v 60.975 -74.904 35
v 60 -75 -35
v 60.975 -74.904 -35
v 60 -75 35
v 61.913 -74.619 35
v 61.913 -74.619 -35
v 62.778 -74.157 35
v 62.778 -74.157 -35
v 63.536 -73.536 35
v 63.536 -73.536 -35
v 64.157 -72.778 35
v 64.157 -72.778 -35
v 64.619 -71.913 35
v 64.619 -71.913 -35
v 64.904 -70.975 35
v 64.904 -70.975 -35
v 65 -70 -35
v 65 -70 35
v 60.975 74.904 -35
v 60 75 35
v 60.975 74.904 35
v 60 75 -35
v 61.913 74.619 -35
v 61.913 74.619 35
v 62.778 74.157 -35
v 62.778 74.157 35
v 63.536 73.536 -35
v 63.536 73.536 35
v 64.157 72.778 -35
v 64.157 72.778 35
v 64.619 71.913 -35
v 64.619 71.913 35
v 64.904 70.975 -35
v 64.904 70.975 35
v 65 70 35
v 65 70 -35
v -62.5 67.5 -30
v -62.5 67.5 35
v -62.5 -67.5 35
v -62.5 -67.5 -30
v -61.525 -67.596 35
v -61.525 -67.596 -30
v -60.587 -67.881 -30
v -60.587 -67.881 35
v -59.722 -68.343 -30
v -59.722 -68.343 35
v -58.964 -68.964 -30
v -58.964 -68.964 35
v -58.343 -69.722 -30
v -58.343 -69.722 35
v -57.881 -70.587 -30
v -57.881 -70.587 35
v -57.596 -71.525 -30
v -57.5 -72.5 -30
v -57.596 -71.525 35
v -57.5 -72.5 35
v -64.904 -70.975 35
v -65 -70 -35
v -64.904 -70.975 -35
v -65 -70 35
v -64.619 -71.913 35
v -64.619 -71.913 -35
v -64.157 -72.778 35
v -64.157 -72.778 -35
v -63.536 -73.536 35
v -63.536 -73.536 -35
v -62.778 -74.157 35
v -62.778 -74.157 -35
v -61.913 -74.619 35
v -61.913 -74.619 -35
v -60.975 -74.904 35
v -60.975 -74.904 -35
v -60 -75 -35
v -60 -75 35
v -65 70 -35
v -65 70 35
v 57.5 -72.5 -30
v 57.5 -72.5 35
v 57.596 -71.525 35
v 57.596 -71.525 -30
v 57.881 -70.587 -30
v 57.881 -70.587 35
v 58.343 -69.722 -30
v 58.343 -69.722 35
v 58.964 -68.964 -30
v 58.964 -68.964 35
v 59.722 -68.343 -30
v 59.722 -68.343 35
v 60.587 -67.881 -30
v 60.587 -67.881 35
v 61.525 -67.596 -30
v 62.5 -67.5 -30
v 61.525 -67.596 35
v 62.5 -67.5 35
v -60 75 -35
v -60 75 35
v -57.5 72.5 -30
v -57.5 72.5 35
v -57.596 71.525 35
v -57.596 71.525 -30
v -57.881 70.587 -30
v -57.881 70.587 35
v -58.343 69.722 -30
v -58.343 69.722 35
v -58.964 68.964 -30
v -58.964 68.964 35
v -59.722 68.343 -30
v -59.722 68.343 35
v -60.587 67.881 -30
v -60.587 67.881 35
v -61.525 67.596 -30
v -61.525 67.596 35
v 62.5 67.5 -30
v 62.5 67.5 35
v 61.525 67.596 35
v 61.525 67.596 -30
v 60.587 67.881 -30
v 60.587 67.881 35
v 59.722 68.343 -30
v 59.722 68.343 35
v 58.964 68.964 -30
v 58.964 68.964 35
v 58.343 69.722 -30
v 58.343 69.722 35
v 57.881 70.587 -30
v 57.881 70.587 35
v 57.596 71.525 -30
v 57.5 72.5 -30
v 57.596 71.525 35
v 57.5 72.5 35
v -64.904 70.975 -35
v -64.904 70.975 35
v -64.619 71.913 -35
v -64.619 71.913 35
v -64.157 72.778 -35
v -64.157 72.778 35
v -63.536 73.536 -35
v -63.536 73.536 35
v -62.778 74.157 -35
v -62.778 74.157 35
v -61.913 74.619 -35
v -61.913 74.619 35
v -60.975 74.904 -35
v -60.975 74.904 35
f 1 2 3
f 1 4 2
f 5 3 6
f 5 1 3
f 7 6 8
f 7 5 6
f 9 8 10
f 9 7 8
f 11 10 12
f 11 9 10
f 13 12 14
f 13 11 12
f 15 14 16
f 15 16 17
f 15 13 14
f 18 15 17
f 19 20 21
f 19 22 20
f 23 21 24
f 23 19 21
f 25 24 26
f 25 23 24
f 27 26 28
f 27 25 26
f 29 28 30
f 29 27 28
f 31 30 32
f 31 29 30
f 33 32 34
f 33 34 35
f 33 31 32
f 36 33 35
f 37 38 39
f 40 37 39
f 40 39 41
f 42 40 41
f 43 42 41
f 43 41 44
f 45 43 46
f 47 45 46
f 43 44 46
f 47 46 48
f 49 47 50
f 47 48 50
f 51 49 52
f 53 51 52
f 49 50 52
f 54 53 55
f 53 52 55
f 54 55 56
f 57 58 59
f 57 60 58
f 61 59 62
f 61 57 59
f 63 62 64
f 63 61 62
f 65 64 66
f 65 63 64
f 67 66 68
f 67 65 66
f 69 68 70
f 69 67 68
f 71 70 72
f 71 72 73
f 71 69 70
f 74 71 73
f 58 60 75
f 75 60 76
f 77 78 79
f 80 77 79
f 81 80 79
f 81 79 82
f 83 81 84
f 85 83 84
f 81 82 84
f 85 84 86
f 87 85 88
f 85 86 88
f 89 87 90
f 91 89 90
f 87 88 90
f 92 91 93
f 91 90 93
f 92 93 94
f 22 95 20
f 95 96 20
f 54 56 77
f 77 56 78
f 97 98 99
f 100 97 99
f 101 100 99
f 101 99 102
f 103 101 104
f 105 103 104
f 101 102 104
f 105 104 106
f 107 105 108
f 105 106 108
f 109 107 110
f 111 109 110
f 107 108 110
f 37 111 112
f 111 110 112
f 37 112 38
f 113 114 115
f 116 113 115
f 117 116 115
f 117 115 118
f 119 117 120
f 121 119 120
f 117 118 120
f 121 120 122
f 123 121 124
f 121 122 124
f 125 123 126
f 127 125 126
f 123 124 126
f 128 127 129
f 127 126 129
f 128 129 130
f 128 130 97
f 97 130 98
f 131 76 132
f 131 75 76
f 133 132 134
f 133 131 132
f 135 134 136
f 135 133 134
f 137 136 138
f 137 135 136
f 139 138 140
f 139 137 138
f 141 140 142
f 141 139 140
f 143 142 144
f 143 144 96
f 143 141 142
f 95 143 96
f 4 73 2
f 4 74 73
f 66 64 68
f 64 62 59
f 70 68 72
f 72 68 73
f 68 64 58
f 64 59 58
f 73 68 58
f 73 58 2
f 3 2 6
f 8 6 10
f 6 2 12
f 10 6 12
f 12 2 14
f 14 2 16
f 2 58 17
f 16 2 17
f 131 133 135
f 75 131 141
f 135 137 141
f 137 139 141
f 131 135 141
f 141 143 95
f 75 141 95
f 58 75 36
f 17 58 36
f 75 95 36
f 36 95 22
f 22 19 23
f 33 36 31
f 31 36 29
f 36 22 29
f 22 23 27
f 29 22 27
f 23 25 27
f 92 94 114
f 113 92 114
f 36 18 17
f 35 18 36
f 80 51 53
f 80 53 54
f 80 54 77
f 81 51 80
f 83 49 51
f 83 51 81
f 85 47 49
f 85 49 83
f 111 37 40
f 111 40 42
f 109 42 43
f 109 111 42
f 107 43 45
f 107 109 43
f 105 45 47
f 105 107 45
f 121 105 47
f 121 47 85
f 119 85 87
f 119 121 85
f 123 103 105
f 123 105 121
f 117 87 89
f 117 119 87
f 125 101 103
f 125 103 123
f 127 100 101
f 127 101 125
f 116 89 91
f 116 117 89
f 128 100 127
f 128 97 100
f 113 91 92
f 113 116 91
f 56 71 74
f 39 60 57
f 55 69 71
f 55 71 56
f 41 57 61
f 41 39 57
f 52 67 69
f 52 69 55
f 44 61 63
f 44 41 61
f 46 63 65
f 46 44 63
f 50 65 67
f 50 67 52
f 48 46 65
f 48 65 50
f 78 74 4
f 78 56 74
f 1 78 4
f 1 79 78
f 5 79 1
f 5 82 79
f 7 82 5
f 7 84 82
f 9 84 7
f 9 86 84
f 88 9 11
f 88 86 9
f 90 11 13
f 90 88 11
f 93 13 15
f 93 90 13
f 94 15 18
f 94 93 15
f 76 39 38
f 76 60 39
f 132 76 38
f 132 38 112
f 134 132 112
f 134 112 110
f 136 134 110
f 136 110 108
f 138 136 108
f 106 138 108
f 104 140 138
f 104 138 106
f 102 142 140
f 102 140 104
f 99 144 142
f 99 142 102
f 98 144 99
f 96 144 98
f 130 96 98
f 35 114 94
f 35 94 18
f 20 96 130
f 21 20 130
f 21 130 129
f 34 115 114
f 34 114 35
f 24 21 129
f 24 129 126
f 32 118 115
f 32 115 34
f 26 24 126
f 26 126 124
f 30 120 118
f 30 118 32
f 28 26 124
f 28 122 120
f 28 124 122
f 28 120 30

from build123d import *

# Parameters (mm, degrees)
SKETCH2_W           = 130
SKETCH2_H           = 150
BOSS_EXTRUDE2_DEPTH = 35
CUT_EXTRUDE2_DEPTH  = 65
FILLET1_R           = 5


with BuildPart() as part:
    # Sketch2 → Boss-Extrude2 (new body, symmetric)
    with BuildSketch(Plane.XY):
        Rectangle(SKETCH2_W, SKETCH2_H)
    extrude(amount=BOSS_EXTRUDE2_DEPTH, both=True)

    # Sketch3 → Cut-Extrude2 (cut)
    with BuildSketch(Plane.XY.offset(35)):
        with BuildLine():
            Line((57.5, 72.5), (-57.5, 72.5))
            ThreePointArc((-57.5, 72.5), (-58.964466094, 68.964466094), (-62.5, 67.5))
            Line((-62.5, 67.5), (-62.5, -67.5))
            ThreePointArc((-62.5, -67.5), (-58.964466094, -68.964466094), (-57.5, -72.5))
            Line((-57.5, -72.5), (57.5, -72.5))
            ThreePointArc((57.5, -72.5), (58.964466094, -68.964466094), (62.5, -67.5))
            Line((62.5, -67.5), (62.5, 67.5))
            ThreePointArc((62.5, 67.5), (58.964466094, 68.964466094), (57.5, 72.5))
        make_face()
    extrude(amount=-CUT_EXTRUDE2_DEPTH, mode=Mode.SUBTRACT)

    # Fillet1
    fillet1_edges = [part.edges().sort_by_distance(p)[0] for p in [
        (65, -75, 0),
        (-65, -75, 0),
        (-65, 75, 0),
        (65, 75, 0),
    ]]
    fillet(fillet1_edges, radius=FILLET1_R)


solid = part.part
